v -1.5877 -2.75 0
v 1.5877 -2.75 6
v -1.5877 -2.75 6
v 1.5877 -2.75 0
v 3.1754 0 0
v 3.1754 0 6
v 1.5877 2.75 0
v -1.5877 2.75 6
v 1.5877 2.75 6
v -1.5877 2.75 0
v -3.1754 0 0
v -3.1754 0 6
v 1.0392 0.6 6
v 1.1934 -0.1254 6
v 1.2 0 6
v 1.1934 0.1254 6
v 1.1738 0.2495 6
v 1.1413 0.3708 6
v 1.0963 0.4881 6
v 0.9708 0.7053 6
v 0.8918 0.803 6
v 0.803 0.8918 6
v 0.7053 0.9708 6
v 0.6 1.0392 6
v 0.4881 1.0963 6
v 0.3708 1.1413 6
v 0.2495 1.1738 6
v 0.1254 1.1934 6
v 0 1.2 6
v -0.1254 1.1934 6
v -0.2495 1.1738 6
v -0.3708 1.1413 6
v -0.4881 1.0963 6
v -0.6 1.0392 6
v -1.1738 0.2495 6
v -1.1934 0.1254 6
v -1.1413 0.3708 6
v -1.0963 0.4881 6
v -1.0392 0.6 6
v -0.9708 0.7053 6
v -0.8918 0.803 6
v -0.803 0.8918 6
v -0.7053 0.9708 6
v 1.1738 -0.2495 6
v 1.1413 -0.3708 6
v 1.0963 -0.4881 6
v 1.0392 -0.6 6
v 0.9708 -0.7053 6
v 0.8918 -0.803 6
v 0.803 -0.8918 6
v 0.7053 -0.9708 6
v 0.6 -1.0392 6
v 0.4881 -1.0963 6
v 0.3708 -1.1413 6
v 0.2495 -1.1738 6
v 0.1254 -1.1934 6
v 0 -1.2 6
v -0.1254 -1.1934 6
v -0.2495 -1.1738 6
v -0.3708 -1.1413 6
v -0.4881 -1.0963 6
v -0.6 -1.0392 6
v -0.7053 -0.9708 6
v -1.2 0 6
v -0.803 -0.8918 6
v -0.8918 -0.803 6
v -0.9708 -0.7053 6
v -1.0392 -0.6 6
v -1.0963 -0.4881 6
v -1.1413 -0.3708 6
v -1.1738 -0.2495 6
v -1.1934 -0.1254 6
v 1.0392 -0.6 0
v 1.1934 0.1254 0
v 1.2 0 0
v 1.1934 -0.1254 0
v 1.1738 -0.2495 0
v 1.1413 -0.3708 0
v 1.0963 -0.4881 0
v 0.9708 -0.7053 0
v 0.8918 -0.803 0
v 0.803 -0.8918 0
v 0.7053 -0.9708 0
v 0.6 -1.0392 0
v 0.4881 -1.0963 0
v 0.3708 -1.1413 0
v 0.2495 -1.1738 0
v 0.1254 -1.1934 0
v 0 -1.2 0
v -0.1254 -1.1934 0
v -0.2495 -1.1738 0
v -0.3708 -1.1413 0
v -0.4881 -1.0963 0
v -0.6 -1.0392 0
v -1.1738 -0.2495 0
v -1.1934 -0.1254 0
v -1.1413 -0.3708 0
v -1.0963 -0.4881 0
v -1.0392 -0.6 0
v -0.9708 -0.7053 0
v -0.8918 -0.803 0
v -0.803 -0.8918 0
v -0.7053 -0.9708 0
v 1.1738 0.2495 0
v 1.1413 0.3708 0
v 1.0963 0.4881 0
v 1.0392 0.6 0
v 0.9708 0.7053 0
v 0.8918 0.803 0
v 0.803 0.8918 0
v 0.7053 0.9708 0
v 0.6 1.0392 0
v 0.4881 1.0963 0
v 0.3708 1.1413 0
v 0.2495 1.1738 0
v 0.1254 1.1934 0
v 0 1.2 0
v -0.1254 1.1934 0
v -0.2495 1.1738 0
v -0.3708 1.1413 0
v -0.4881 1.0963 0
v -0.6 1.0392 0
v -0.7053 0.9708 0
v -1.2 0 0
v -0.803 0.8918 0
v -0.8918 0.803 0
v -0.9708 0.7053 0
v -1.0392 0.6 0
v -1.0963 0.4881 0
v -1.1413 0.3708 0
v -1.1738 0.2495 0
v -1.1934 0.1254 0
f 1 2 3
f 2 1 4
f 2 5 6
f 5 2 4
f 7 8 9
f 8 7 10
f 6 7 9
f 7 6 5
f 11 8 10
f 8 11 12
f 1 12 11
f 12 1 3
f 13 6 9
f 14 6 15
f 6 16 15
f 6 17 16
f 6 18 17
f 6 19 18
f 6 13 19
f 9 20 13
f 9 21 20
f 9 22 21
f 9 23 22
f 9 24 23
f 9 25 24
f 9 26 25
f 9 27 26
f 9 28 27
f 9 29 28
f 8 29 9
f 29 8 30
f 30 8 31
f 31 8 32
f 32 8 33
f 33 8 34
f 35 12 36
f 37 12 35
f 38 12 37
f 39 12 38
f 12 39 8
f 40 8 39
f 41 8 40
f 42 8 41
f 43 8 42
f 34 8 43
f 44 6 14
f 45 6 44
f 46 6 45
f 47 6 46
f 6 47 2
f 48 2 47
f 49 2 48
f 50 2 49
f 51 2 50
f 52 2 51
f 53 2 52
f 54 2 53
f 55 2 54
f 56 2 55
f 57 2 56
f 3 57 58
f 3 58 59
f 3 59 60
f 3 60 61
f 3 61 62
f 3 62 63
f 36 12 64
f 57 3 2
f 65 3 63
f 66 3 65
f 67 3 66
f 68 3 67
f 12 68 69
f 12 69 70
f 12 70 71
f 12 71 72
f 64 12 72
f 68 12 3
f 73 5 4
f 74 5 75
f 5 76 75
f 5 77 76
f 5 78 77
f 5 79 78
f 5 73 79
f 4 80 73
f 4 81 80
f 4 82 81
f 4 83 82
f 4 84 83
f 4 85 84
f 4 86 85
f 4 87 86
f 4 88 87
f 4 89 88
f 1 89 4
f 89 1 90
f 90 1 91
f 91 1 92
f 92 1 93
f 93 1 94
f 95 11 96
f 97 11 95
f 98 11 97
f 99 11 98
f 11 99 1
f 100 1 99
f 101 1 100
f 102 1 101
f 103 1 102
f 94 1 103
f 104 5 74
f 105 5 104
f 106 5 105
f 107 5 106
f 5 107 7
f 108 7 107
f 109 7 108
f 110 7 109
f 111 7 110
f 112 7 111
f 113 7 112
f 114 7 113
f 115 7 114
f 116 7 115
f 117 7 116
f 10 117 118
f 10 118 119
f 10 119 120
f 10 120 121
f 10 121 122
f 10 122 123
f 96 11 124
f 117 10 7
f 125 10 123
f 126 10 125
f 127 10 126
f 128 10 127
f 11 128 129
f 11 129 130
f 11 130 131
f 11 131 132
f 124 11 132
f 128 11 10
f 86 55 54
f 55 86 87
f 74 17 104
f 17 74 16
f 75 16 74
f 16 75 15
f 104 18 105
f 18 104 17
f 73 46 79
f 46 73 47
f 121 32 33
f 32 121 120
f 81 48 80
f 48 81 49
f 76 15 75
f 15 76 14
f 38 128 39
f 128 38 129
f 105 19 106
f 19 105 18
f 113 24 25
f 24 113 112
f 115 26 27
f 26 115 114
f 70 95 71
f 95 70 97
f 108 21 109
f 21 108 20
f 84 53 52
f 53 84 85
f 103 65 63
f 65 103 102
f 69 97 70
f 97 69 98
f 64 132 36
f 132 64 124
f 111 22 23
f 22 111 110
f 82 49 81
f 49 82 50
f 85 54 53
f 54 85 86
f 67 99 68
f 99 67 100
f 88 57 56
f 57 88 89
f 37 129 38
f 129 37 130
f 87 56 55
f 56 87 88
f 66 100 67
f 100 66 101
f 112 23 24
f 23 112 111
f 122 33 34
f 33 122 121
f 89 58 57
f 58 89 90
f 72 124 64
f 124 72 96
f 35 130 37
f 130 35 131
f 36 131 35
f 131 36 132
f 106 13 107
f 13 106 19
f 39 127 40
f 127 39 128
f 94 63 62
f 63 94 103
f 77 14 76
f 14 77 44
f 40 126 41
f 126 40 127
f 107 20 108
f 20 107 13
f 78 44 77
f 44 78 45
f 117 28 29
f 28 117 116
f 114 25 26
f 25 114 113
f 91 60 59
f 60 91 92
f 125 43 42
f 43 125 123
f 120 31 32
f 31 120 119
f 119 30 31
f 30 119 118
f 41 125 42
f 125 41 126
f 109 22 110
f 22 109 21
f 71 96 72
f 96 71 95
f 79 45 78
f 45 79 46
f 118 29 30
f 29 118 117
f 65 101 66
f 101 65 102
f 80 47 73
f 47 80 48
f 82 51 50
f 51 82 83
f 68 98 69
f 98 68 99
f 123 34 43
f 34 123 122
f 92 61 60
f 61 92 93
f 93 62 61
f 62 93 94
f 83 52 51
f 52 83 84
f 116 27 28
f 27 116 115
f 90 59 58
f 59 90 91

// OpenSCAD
// Hex standoff, 6 mm long.
$fn = 60;
eps = 0.02;
thread_d = 2.4;
flat = 5.5;
length = 6;
chamfer = 1.2;
difference() {
    union() {
        cylinder(d = flat / cos(30), h = length, $fn = 6);
        cylinder(d1 = flat / cos(30) - 2 * chamfer, d2 = flat / cos(30), h = chamfer, $fn = 6);
        translate([0, 0, length - chamfer]) cylinder(d1 = flat / cos(30), d2 = flat / cos(30) - 2 * chamfer, h = chamfer, $fn = 6);
    }
    translate([0, 0, -eps]) cylinder(d = thread_d, h = length + 2 * eps);
}
